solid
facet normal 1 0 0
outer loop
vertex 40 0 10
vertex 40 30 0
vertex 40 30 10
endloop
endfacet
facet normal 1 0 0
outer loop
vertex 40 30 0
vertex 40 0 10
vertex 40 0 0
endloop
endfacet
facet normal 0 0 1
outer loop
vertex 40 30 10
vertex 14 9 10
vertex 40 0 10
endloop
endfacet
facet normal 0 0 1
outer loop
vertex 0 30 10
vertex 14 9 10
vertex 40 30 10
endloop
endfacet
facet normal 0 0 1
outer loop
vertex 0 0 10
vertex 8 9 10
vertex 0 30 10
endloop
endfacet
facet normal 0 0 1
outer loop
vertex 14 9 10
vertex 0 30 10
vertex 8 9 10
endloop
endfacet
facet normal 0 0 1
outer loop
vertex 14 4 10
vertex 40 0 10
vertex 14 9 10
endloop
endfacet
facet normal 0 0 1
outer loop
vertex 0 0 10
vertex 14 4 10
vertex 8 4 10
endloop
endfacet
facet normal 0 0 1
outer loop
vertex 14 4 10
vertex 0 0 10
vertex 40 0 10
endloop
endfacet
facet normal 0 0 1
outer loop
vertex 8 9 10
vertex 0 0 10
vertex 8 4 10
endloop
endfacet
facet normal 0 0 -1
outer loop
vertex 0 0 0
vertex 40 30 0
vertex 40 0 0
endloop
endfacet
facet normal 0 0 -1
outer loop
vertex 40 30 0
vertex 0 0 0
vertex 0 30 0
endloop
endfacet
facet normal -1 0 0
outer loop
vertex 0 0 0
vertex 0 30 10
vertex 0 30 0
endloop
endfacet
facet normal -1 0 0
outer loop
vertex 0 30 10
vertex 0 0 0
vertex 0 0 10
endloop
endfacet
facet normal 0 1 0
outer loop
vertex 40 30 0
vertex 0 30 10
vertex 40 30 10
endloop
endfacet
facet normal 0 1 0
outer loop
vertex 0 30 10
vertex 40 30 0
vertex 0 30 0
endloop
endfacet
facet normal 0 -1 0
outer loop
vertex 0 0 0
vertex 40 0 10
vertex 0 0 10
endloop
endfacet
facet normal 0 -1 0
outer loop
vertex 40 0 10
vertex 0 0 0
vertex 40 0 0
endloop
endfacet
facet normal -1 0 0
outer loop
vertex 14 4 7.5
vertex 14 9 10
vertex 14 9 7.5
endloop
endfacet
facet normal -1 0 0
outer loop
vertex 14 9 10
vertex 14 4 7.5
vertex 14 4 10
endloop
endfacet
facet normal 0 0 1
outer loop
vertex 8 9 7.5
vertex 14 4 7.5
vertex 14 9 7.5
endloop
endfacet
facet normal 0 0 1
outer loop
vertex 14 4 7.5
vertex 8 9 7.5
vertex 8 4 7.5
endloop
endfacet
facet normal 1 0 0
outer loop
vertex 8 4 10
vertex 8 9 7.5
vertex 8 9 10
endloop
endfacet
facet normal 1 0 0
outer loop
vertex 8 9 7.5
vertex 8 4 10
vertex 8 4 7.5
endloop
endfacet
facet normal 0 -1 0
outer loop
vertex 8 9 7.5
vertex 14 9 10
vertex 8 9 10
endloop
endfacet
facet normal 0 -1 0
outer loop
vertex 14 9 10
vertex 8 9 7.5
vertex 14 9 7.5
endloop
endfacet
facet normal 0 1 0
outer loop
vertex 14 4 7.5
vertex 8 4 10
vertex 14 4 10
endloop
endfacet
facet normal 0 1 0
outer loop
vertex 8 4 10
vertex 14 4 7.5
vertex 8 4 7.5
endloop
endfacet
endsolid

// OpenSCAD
// units=mm — generated by scad_emitter.py
// part=unnamed
$fn = 48;

difference() { cube([40, 30, 10]); translate([8, 4, 7.5]) cube([6, 5, 3]); }
